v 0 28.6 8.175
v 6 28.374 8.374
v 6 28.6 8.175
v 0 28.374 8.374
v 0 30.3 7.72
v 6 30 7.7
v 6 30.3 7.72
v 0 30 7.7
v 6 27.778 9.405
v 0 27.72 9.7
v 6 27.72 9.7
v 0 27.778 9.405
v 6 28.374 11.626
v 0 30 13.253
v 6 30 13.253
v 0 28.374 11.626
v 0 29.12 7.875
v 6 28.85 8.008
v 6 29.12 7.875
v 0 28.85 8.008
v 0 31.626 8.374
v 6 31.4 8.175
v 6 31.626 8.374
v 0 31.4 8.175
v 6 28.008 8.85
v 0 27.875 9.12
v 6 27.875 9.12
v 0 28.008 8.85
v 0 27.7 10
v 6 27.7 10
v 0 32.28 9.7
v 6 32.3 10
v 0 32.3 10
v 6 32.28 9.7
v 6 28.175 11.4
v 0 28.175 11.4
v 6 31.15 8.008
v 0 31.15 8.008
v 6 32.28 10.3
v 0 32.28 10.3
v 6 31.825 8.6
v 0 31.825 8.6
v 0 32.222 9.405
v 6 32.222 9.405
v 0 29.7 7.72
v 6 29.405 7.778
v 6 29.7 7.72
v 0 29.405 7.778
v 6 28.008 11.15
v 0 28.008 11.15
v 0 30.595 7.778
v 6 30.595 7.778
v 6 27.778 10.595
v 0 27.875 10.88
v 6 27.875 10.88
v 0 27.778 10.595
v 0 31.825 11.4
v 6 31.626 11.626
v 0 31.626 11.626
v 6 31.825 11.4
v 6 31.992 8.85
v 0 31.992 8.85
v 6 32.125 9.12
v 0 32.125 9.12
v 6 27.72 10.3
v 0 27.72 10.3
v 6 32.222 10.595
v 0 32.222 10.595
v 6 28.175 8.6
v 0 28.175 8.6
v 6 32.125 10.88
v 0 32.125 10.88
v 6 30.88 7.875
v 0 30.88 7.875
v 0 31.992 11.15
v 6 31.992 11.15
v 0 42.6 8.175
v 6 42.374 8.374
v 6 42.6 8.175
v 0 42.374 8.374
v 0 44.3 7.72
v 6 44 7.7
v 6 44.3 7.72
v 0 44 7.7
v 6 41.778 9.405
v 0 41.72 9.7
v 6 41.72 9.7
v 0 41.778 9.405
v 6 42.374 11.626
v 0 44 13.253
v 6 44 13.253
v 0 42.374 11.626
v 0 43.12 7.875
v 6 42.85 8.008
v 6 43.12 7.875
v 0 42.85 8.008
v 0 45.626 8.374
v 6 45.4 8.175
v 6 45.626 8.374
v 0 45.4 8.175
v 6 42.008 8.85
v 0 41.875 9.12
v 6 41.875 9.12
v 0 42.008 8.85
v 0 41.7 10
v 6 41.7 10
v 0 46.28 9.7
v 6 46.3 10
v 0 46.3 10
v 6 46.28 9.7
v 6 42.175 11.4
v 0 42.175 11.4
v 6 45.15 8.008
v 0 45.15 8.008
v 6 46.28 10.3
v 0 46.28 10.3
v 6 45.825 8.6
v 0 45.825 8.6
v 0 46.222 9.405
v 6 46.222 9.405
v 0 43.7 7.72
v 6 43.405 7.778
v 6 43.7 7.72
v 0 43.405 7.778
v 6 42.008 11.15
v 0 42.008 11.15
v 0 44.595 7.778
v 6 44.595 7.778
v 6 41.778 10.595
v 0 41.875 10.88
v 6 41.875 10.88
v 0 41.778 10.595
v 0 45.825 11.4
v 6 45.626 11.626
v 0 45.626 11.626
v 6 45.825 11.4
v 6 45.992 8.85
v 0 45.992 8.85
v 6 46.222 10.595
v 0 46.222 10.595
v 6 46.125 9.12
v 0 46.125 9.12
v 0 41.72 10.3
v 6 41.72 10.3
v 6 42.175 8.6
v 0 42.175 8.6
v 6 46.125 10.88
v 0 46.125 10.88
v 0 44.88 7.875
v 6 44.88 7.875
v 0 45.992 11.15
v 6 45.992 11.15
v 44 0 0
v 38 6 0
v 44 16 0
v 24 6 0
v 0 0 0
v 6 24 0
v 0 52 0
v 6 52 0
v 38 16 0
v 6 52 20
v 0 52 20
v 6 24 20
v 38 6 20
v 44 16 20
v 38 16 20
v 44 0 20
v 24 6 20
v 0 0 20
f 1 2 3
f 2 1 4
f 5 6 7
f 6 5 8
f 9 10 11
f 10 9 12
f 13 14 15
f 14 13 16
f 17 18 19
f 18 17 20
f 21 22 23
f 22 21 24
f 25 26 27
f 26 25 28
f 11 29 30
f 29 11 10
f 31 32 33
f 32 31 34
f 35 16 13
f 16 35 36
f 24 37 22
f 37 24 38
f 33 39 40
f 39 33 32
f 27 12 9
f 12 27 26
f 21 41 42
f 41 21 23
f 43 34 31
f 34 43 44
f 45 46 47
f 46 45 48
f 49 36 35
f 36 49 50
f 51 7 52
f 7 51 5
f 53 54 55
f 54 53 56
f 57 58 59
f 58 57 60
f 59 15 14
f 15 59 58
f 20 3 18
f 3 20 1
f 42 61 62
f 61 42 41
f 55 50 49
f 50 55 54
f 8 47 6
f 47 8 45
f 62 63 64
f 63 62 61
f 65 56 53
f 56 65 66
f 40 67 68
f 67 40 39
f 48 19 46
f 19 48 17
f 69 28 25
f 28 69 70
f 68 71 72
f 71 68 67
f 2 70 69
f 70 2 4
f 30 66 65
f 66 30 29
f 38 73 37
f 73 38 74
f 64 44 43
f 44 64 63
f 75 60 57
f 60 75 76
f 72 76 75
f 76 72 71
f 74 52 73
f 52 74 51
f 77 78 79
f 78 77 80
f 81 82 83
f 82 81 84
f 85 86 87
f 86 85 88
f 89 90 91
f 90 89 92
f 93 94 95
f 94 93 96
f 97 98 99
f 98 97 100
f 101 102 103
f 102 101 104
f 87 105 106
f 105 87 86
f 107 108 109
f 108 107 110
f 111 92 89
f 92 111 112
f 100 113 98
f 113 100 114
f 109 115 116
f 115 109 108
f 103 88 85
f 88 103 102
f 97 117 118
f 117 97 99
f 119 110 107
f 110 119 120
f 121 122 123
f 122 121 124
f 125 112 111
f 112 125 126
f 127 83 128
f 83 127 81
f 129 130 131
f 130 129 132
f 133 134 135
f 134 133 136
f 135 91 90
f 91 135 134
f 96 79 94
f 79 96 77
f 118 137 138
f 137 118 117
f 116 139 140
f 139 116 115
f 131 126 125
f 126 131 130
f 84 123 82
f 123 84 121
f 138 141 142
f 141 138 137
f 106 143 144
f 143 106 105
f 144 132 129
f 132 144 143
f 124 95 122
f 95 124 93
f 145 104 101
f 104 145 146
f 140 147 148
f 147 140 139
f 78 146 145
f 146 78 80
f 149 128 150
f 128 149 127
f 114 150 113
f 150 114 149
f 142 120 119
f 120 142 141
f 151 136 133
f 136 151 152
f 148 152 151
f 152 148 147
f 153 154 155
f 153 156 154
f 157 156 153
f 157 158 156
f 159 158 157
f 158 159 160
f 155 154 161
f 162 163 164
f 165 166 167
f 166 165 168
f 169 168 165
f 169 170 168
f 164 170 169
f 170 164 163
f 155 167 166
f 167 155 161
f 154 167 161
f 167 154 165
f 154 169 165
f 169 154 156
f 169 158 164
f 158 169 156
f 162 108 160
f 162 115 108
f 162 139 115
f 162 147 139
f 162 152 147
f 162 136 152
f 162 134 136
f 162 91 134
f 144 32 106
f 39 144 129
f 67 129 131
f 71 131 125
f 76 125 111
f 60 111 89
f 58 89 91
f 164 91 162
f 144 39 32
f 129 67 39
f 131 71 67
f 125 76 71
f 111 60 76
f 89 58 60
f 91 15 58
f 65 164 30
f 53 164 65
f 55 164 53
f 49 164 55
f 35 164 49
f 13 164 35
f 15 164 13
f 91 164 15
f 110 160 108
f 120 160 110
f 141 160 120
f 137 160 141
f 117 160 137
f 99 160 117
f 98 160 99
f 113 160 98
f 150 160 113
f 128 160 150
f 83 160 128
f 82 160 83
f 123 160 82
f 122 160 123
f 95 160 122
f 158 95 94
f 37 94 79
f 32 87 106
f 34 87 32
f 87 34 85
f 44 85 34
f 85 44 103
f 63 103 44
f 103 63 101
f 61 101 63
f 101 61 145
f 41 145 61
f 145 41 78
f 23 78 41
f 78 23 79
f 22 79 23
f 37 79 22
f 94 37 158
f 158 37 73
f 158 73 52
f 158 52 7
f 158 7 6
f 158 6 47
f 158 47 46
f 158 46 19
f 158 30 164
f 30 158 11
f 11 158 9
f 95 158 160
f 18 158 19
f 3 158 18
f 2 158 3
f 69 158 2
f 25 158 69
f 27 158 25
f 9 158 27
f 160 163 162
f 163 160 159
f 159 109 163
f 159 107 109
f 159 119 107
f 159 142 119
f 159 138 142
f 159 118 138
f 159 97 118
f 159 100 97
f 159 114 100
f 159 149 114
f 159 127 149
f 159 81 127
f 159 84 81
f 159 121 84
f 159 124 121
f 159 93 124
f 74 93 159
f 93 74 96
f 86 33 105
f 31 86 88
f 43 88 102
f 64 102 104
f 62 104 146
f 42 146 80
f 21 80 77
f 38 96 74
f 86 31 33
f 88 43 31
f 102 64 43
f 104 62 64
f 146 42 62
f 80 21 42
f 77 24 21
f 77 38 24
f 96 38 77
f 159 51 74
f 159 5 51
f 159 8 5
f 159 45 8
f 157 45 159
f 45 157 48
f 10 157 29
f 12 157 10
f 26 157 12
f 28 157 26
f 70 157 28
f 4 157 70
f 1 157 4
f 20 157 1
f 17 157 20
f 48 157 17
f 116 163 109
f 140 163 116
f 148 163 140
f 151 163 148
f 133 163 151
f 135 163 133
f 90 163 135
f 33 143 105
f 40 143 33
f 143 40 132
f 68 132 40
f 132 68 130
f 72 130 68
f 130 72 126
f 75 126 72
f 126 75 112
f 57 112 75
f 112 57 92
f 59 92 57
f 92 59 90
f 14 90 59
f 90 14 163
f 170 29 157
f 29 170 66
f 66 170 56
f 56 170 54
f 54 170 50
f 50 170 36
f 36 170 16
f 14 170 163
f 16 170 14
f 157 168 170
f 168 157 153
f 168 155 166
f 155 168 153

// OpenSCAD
// Screw-on desk-edge headphone hook; print on its broad side as laid out.
// The teardrop screw bores print without support; use two 4 mm wood screws.
reach = 44; // Hook projection from desk, mm [35:1:60]
height = 52; // Mounting flange height, mm [45:1:70]
width = 20; // Headband bearing width, mm [16:1:30]
wall = 6; // Hook and flange thickness, mm [4:0.5:8]
lip_height = 16; // Retaining lip height, mm [12:1:22]
gusset = 18; // Brace length, mm [12:1:24]
screw_diameter = 4.6; // Screw clearance, mm [4.2:0.2:5]
screw_spacing = 14; // Screw centre spacing, mm [12:1:18]
top_margin = 8; // Upper screw edge margin, mm [7:1:12]
$fn = 48; // Bore resolution
cut_extra = 1; // Cutter overlap, mm

module hook_outline() {
    polygon([[0,0],[reach,0],[reach,lip_height],
             [reach-wall,lip_height],[reach-wall,wall],
             [wall+gusset,wall],[wall,wall+gusset],
             [wall,height],[0,height]]);
}

module screw_bore(y) {
    radius = screw_diameter/2;
    translate([-cut_extra,y,width/2])
        rotate([90,0,90]) linear_extrude(wall+2*cut_extra)
            union() {
                circle(r=radius);
                polygon([[-radius/sqrt(2),radius/sqrt(2)],
                         [0,radius*sqrt(2)],
                         [radius/sqrt(2),radius/sqrt(2)]]);
            }
}

difference() {
    linear_extrude(width) hook_outline();
    for (y = [height-top_margin-screw_spacing,height-top_margin])
        screw_bore(y);
}
